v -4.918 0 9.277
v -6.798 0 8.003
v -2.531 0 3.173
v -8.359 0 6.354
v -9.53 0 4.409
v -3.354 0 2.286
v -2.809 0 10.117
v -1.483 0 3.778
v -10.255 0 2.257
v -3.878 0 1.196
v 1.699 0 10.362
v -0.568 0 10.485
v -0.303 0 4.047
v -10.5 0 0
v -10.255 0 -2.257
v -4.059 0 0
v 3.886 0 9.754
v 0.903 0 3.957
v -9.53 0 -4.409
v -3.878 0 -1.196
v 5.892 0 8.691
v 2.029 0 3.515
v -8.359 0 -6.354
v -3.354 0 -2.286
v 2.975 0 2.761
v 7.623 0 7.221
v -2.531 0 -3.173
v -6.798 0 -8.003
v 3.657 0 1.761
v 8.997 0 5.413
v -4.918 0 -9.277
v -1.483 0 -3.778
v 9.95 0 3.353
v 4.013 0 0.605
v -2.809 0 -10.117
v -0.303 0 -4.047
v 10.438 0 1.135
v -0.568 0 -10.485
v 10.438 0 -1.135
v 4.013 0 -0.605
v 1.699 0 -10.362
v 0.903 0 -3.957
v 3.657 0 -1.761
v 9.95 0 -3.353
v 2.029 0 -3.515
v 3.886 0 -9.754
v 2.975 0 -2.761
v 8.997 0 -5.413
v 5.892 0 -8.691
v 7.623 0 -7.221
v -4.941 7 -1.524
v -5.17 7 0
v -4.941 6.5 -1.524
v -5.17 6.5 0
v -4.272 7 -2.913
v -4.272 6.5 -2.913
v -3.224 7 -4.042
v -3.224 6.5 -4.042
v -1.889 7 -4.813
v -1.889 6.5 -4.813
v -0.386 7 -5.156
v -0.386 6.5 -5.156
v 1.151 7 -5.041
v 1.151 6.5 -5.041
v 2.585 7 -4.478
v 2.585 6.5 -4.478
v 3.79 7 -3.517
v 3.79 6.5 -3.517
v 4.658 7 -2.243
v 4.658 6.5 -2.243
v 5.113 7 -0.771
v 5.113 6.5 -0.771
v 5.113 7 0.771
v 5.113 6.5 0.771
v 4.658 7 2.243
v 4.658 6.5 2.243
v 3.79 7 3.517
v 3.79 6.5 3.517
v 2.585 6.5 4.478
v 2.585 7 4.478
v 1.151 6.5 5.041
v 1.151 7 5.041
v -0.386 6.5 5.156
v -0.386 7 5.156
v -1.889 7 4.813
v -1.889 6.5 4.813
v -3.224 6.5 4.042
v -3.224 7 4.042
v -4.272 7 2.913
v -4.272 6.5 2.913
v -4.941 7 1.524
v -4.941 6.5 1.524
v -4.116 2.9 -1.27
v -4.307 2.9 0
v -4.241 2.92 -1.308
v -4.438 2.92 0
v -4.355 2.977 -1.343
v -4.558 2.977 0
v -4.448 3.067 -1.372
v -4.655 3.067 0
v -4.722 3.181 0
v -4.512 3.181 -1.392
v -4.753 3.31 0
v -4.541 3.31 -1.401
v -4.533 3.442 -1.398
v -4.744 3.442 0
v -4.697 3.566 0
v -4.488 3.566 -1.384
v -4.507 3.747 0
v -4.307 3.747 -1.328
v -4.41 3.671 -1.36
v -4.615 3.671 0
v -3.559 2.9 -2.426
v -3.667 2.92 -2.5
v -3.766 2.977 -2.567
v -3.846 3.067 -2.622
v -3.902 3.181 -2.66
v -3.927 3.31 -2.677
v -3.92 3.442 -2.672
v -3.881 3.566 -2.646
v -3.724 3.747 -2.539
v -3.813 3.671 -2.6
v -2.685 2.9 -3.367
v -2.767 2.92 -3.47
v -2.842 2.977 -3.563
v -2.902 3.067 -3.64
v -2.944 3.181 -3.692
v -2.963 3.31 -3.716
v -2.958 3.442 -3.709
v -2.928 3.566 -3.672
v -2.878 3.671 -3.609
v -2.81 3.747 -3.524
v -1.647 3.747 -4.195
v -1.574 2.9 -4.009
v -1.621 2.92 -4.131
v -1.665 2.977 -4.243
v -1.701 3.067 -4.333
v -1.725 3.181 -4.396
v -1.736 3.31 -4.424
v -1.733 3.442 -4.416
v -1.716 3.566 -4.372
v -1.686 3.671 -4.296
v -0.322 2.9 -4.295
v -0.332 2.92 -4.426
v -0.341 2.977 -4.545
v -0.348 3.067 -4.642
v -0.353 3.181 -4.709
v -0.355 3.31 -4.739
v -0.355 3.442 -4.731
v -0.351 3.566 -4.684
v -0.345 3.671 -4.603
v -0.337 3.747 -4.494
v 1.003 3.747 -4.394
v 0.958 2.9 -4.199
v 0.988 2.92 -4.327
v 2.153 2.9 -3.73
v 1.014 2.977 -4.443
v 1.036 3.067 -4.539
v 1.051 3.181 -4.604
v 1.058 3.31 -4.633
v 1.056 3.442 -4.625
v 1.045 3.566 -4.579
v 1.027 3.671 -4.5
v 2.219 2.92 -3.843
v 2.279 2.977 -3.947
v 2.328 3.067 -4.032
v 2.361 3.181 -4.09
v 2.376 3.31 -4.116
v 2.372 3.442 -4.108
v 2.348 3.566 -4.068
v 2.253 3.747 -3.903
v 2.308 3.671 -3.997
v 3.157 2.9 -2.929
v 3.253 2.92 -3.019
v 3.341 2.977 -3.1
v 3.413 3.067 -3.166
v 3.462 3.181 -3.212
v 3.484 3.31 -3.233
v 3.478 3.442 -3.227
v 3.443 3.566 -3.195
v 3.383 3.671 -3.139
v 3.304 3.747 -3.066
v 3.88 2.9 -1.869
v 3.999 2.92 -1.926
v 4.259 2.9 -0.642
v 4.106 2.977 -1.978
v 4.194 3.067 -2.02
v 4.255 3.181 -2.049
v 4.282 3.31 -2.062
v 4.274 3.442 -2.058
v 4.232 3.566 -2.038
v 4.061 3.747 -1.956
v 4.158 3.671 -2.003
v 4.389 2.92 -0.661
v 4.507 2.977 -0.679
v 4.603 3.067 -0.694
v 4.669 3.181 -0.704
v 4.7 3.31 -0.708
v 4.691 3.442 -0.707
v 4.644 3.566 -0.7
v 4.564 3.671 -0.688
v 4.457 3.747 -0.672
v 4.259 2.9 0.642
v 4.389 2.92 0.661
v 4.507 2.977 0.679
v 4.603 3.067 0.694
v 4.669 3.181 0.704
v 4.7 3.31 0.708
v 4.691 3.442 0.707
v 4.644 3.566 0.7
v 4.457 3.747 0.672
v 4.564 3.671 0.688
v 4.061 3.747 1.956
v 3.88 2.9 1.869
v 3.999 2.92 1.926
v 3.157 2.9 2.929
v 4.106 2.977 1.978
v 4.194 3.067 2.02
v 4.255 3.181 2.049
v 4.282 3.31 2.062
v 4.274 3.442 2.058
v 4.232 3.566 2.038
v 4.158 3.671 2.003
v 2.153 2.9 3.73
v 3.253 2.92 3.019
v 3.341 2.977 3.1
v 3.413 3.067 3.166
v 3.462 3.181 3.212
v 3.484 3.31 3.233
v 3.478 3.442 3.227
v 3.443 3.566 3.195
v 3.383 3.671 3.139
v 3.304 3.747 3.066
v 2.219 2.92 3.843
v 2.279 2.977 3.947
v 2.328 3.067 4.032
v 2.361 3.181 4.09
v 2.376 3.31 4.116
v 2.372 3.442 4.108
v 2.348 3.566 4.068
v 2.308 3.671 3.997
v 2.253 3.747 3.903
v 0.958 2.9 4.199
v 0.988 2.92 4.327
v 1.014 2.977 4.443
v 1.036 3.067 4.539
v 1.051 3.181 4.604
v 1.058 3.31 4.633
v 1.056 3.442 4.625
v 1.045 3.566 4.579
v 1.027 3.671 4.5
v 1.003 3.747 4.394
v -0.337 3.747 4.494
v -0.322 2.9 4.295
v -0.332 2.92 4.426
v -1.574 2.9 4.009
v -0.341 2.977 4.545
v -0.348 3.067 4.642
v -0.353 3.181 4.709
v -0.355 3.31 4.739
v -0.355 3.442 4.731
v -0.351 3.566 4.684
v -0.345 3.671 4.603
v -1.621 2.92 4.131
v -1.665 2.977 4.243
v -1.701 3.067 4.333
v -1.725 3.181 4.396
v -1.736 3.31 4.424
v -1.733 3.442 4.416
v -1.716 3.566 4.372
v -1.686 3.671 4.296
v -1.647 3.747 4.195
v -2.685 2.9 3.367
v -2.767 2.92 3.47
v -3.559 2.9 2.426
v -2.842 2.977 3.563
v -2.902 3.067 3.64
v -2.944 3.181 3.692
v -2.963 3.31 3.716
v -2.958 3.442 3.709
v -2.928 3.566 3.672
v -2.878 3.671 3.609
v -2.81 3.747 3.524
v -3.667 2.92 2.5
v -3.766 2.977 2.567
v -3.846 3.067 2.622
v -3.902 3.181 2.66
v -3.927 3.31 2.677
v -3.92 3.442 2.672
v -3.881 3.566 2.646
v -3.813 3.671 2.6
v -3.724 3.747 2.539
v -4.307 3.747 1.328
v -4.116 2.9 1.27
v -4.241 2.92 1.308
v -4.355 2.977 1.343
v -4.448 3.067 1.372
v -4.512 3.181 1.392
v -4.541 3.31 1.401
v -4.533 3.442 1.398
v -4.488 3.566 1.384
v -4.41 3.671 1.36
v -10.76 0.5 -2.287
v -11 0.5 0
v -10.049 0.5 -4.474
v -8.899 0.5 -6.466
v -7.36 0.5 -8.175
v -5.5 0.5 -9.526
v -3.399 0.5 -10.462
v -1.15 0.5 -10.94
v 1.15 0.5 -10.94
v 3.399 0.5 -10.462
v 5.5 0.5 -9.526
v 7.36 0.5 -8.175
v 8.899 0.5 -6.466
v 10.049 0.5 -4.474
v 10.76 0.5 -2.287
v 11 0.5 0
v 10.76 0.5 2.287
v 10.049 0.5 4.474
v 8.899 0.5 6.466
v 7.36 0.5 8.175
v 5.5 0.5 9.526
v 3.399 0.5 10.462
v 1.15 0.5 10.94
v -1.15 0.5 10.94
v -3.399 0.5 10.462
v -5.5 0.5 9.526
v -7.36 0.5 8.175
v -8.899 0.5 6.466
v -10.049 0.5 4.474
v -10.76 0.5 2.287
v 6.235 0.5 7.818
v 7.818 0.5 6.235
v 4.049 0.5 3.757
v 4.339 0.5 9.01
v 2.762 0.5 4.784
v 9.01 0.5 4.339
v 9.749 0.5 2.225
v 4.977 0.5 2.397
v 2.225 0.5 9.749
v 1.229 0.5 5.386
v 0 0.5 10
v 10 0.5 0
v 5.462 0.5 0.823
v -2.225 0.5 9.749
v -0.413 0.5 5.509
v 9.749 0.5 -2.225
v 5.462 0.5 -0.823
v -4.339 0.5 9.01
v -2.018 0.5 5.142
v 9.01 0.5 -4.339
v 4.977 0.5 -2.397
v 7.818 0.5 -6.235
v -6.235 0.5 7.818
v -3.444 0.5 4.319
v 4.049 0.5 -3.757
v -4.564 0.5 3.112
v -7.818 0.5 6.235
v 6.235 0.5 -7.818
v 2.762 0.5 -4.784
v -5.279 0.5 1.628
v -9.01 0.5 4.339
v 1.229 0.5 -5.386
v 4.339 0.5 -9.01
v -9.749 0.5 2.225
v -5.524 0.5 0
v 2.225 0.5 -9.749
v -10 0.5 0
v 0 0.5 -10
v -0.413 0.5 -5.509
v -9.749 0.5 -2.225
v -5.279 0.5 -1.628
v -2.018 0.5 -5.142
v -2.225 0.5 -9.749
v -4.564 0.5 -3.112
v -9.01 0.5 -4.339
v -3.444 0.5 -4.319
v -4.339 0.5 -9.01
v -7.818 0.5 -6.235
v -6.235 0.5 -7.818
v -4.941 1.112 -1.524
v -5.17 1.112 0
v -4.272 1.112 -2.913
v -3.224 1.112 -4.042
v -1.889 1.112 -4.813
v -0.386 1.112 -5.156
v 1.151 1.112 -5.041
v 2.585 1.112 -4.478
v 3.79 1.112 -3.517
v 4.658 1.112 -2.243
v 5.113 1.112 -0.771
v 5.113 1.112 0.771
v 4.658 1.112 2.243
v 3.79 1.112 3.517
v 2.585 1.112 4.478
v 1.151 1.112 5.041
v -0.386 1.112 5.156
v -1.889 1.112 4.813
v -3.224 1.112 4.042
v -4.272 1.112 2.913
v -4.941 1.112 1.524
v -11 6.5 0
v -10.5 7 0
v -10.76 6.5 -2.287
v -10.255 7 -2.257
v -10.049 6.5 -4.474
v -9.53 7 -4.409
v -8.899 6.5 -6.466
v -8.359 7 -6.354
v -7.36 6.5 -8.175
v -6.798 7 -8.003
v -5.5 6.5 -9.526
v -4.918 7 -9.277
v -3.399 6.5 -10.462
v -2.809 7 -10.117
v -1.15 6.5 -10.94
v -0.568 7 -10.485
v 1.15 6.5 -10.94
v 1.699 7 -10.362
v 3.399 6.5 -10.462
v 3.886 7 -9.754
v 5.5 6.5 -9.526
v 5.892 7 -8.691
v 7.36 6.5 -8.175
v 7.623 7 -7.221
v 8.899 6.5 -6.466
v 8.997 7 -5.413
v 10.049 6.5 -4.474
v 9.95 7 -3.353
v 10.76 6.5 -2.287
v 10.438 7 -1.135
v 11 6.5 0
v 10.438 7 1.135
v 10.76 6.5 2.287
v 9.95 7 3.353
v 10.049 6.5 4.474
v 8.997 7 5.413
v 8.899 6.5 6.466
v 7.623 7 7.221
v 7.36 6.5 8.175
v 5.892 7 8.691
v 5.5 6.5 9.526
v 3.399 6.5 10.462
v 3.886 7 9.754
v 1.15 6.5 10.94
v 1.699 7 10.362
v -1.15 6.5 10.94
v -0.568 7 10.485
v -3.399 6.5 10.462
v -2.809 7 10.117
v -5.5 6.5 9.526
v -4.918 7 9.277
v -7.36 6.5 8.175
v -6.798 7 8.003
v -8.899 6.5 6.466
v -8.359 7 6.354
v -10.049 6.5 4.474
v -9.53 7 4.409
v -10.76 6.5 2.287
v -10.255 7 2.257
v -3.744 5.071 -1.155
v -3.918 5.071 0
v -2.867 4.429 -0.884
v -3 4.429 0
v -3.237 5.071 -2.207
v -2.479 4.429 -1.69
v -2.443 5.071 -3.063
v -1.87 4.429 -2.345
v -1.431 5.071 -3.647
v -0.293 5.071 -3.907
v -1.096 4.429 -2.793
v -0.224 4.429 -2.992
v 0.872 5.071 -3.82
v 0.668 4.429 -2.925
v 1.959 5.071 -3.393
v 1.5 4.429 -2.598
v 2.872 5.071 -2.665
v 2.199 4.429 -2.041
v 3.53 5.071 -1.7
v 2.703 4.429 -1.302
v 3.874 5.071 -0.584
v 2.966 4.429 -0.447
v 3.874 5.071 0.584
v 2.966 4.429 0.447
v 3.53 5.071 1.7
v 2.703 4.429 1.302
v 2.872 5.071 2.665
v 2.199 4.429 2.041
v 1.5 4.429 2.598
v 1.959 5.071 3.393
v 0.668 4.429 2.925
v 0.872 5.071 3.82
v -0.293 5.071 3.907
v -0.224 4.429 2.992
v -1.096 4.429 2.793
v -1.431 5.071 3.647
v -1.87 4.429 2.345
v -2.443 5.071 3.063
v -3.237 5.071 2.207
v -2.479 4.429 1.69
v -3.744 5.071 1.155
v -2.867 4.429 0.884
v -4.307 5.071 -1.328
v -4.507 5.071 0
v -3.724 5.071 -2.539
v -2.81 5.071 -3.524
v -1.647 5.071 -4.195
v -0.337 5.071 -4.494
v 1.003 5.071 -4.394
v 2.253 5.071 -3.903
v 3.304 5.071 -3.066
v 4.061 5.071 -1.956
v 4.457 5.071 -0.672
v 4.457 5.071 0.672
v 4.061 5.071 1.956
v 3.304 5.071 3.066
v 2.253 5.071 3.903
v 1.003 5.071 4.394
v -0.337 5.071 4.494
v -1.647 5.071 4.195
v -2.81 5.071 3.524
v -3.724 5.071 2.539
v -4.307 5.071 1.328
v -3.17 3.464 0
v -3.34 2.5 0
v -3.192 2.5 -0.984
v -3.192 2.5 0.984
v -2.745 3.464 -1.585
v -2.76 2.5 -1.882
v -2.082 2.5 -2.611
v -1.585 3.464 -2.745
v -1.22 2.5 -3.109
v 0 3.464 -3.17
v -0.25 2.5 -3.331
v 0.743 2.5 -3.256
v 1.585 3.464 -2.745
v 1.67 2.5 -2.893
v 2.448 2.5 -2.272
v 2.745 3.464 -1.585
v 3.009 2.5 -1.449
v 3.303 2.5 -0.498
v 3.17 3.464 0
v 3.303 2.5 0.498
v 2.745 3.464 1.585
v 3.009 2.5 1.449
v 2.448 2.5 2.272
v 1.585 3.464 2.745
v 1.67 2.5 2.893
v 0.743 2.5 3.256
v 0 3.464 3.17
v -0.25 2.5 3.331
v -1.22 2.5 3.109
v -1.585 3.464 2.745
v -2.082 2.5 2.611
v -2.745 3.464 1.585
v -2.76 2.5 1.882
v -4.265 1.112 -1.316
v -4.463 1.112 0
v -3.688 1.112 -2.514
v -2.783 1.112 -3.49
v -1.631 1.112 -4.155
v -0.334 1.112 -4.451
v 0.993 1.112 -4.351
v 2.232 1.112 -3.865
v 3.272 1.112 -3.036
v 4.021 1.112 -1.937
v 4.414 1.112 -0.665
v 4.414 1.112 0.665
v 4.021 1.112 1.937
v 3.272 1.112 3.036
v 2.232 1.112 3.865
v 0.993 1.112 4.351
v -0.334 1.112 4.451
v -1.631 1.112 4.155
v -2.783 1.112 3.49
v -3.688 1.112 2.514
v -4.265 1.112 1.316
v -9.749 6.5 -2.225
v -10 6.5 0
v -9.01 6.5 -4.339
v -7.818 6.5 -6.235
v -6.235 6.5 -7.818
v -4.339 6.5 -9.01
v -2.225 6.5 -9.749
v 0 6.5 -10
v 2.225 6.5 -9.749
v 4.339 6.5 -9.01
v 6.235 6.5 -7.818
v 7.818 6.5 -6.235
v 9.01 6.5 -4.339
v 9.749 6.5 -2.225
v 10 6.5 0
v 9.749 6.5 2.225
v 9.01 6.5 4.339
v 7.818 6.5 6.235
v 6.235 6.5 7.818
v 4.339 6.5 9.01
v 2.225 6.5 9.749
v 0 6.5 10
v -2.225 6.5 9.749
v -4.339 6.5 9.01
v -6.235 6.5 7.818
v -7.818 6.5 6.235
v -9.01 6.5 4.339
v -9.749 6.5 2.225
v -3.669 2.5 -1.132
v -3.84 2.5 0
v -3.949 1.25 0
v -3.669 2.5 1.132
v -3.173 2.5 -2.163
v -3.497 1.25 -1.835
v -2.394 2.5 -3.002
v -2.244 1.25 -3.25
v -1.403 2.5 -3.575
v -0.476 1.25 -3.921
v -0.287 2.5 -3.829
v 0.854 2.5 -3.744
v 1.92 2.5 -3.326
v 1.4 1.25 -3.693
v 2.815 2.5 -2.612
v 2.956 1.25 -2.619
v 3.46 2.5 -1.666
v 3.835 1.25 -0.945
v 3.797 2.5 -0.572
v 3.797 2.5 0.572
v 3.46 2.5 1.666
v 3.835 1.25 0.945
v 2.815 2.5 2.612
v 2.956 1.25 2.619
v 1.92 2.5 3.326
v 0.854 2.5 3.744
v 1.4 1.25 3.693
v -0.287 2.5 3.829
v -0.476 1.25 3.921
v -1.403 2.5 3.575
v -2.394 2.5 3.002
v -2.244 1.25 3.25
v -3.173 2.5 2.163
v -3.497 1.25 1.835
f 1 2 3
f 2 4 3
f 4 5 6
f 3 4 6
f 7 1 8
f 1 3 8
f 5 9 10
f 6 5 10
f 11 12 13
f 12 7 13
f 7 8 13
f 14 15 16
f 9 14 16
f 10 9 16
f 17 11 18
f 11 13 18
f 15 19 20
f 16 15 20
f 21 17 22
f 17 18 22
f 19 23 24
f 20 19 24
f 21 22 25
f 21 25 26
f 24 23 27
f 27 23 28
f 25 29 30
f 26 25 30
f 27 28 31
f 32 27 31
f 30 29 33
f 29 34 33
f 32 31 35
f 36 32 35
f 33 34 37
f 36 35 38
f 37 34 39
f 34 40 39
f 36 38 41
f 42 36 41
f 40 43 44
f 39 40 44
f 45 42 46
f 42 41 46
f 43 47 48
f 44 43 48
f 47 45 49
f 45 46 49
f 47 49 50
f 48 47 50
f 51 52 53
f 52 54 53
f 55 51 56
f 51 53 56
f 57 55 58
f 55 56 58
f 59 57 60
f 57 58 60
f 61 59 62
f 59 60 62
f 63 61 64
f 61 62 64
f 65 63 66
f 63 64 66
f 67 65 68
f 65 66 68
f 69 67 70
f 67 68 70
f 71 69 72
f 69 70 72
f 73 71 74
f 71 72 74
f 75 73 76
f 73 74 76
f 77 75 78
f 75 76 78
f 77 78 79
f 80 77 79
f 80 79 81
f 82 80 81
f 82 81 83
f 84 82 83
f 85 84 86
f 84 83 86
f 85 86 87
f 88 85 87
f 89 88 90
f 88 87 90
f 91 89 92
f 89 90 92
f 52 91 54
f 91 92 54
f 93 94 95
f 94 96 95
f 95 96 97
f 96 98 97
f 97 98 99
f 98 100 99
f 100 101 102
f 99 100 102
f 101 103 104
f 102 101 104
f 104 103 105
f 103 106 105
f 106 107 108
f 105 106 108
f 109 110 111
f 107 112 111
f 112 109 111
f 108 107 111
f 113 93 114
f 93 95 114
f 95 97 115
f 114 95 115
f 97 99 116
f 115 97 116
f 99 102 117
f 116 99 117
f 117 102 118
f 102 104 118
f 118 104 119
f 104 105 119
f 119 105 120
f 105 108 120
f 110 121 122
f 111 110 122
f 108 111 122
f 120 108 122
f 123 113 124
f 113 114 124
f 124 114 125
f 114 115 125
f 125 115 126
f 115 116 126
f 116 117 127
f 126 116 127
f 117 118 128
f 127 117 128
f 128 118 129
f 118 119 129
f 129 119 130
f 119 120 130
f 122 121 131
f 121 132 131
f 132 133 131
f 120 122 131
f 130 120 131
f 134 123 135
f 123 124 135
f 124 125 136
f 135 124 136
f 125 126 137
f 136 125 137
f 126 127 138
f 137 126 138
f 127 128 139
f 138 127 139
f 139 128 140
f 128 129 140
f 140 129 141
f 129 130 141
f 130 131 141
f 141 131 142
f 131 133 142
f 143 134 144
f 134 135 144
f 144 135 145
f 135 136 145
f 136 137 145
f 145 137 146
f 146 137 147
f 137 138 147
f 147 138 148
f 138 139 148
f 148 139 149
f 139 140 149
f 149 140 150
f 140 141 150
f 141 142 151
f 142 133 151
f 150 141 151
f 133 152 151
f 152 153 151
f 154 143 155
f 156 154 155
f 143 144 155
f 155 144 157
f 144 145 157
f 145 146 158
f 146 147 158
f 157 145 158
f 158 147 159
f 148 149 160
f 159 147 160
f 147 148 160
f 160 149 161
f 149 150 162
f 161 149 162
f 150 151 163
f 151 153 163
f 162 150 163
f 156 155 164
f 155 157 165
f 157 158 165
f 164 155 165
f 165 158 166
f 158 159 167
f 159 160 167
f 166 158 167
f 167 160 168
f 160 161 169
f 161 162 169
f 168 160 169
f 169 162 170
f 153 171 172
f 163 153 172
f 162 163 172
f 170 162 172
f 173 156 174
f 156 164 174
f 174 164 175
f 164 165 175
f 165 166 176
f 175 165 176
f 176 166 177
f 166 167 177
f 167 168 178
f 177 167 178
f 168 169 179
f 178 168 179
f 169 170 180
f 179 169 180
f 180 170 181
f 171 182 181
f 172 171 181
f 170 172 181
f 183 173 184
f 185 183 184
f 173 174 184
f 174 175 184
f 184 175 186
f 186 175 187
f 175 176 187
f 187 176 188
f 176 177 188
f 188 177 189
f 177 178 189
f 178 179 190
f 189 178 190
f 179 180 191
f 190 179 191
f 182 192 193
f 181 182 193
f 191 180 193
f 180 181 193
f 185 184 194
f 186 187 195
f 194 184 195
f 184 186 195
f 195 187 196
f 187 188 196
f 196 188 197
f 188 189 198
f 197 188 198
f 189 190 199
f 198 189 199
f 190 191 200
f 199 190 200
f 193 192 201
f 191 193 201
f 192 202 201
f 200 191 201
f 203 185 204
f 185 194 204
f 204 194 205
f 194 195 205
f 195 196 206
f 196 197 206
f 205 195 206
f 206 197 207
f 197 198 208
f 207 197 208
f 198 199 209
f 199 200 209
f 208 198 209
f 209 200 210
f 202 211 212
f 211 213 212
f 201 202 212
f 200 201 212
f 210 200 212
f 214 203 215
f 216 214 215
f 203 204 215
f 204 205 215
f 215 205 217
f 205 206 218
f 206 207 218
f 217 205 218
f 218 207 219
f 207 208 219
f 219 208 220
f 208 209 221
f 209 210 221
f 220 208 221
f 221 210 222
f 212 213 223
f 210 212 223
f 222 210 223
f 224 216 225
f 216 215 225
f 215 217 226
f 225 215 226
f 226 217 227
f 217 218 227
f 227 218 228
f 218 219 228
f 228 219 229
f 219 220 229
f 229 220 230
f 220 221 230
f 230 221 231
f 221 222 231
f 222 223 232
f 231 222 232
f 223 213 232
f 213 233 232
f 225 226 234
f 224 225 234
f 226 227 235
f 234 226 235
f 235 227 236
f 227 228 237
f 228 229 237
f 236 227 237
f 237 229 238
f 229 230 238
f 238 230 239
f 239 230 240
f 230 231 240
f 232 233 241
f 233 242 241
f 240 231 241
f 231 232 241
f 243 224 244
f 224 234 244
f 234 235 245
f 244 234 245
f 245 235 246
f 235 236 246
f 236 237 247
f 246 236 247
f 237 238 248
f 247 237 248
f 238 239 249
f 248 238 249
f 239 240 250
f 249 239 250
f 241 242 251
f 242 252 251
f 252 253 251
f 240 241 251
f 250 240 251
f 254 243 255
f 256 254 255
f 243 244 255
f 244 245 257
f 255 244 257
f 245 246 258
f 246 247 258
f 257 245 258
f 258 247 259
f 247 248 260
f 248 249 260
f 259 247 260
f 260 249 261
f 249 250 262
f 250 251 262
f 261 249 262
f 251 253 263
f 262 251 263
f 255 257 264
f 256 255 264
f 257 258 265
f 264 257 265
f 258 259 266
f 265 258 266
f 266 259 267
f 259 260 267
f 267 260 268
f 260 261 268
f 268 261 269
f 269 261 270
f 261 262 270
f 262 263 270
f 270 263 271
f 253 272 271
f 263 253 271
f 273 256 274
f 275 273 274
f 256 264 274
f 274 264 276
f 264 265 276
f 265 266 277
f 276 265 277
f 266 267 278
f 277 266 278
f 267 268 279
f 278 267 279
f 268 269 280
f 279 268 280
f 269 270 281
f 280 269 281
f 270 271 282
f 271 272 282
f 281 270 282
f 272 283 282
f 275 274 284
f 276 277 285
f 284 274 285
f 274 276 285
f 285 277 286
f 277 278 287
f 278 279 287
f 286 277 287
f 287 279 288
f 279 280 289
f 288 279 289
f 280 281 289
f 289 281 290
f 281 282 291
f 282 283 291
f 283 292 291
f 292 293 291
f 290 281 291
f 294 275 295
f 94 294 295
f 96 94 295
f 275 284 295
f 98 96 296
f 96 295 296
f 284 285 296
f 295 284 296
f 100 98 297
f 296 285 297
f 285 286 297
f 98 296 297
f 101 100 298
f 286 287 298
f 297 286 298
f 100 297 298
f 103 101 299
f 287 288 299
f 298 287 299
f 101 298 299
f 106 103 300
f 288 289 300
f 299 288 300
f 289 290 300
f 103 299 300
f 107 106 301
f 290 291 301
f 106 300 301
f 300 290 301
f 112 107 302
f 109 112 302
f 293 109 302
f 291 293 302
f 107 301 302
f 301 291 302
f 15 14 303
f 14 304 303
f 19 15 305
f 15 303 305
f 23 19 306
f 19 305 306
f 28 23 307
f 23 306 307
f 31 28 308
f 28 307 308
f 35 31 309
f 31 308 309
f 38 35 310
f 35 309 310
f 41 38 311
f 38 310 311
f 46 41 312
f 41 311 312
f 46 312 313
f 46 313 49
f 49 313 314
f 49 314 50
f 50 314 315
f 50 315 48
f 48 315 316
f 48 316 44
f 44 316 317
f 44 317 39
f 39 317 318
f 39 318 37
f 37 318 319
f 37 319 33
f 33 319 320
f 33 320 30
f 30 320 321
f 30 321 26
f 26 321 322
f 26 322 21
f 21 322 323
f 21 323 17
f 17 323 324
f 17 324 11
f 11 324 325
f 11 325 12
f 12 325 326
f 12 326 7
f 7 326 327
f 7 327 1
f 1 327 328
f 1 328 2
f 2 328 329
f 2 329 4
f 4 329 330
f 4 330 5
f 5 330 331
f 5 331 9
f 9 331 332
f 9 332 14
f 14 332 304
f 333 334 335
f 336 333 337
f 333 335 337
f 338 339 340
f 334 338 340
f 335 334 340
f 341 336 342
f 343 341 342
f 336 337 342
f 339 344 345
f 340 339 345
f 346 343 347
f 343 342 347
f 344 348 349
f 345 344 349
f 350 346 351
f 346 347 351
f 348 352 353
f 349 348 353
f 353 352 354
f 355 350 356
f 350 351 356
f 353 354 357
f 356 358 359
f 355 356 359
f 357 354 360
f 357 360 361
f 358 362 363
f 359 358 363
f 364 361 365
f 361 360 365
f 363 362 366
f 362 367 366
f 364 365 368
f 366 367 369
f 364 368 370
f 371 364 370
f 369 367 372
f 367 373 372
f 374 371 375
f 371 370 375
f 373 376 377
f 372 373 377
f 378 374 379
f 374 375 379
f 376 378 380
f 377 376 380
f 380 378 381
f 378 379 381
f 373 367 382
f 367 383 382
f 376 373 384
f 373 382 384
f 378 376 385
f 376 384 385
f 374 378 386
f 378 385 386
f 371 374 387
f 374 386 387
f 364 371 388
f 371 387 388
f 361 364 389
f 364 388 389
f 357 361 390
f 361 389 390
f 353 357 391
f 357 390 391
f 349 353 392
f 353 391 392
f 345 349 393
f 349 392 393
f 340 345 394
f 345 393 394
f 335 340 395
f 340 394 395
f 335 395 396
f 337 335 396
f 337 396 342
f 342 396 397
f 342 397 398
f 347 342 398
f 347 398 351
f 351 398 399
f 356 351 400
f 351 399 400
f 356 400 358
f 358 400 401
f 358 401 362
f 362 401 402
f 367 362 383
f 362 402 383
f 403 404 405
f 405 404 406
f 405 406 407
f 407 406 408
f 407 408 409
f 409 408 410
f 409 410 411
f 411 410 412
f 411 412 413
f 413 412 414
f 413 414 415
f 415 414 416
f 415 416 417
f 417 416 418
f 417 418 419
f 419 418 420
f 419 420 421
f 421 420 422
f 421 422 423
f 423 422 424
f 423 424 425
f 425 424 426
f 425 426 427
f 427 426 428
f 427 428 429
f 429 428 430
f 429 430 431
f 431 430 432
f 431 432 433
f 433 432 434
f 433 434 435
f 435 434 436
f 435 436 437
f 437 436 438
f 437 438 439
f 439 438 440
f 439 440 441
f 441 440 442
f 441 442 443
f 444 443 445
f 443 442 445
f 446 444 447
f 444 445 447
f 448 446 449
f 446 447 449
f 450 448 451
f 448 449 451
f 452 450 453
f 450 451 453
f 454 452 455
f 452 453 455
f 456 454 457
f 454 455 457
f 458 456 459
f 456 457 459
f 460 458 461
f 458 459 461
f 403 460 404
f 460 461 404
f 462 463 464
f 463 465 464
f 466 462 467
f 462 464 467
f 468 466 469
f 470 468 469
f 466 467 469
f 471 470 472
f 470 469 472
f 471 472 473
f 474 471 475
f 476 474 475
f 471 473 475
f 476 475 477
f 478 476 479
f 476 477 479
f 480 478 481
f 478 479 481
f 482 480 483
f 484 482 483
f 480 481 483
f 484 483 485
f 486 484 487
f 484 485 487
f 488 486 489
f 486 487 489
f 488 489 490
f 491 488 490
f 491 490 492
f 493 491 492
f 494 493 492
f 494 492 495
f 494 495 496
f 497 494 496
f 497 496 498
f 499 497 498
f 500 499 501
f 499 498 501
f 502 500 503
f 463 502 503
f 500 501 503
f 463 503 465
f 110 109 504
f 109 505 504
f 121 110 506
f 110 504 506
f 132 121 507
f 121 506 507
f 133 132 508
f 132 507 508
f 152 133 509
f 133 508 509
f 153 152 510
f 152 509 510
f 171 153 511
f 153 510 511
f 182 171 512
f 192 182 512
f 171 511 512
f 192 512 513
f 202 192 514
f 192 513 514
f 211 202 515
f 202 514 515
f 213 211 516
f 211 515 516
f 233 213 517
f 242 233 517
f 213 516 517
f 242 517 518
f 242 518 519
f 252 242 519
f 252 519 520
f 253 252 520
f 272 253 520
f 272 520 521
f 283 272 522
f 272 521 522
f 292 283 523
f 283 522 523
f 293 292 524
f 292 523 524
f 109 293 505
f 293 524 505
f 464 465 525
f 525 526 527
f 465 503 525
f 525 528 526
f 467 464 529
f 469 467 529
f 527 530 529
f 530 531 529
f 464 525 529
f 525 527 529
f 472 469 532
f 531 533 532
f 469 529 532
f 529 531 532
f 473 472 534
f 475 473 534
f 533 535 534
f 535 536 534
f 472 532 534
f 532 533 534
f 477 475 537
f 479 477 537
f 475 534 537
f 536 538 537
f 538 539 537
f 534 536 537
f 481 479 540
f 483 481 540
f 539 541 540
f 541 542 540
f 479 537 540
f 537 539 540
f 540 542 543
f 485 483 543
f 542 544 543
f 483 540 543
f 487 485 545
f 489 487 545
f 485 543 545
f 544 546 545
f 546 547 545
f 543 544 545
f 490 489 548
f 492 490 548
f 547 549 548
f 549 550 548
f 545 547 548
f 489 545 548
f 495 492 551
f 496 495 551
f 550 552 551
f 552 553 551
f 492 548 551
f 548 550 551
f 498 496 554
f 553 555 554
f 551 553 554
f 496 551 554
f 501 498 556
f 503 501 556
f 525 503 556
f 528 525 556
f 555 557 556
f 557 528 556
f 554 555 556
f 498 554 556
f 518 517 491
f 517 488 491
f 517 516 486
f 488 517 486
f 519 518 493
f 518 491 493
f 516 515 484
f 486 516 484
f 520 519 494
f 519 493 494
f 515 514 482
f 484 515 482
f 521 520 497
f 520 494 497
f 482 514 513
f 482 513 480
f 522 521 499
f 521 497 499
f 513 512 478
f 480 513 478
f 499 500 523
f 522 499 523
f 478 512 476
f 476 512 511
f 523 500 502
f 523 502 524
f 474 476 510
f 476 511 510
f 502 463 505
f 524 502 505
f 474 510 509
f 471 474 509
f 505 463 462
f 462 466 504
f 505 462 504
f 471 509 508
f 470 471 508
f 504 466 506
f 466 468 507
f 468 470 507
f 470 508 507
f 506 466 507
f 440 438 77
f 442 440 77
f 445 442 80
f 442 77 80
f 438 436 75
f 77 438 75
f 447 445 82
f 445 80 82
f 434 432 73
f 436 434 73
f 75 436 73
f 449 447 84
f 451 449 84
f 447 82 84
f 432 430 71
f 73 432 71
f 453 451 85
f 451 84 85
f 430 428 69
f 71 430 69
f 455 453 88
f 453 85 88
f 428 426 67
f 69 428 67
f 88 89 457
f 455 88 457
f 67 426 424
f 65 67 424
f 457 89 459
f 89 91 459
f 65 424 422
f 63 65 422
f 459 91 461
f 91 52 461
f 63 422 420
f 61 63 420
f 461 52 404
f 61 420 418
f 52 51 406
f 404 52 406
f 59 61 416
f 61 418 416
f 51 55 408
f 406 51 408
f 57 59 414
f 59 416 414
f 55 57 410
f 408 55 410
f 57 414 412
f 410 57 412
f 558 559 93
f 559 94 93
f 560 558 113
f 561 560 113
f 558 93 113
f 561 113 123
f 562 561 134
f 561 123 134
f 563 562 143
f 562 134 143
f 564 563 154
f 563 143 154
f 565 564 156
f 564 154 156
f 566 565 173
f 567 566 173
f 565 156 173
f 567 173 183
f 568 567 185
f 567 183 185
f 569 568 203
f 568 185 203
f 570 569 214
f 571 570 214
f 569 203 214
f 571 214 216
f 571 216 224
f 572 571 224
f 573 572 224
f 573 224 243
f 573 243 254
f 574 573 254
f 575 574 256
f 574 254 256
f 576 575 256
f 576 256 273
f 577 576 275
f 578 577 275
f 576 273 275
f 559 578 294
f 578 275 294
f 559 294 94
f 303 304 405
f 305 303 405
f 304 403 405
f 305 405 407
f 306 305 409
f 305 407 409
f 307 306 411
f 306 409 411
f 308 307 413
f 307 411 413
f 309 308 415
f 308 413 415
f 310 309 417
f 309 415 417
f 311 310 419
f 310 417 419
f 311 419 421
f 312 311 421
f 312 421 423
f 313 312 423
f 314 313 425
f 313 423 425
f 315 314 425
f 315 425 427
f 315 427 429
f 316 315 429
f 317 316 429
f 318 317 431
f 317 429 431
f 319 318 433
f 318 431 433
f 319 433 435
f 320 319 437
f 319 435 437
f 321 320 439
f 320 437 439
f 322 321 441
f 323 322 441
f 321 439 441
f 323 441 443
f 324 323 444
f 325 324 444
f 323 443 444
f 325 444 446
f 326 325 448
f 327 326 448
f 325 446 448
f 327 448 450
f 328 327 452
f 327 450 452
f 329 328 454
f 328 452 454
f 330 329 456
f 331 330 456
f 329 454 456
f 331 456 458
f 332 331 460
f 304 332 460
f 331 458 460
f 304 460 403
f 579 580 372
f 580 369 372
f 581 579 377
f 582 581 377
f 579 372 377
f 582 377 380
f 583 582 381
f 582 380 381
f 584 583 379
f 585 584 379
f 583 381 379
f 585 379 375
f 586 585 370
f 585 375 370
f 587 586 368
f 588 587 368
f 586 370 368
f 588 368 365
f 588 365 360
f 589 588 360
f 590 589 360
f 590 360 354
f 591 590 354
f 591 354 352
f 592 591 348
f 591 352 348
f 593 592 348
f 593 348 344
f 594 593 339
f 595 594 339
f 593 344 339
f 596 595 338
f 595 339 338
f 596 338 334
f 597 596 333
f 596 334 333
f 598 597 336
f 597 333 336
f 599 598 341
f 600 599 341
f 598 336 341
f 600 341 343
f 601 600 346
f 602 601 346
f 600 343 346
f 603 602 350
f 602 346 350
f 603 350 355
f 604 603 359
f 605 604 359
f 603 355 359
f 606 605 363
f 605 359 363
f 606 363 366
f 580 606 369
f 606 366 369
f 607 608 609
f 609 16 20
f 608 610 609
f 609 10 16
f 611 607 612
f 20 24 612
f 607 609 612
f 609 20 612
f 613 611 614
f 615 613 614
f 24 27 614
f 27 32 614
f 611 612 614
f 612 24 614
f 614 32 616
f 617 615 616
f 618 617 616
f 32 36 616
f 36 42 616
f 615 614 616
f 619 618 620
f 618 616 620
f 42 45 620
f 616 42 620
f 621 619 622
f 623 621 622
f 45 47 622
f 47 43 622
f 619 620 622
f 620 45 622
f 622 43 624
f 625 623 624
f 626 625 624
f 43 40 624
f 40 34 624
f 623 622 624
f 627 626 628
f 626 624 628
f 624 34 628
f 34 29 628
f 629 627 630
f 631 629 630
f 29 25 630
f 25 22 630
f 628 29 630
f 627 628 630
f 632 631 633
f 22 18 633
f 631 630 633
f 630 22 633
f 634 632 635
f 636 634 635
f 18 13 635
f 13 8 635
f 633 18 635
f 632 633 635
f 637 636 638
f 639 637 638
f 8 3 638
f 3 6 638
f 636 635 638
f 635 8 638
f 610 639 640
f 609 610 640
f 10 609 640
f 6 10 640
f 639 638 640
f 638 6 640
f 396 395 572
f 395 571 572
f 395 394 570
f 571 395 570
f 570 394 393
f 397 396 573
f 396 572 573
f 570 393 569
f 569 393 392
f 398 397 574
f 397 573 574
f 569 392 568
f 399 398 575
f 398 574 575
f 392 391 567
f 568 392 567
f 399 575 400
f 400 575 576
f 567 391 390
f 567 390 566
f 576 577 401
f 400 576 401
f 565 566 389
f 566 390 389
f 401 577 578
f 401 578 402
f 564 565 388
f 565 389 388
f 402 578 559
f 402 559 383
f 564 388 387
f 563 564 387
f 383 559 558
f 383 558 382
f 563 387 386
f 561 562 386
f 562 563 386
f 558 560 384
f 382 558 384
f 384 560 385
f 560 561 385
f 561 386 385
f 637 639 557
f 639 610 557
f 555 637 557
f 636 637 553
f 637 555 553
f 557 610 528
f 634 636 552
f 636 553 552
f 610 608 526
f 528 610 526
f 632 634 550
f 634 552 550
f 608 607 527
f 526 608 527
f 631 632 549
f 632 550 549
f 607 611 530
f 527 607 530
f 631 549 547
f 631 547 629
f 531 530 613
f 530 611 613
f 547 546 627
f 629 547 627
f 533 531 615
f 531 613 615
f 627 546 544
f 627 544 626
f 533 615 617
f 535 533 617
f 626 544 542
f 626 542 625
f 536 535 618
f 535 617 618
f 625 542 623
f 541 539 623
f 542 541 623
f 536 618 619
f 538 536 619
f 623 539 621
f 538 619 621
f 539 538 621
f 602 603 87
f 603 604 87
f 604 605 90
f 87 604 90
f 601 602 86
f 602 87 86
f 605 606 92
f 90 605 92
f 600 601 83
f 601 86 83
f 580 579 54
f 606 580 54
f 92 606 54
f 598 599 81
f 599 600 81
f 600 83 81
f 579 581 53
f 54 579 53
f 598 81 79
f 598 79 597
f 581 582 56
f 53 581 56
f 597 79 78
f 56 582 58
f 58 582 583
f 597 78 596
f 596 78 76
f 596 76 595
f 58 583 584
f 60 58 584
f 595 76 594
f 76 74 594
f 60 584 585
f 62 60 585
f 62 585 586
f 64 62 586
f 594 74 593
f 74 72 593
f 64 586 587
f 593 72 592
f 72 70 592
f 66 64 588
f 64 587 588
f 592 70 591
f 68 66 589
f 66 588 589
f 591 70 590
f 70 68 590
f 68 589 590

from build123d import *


with BuildPart() as part:
    # 草图1 → 旋转1 (revolve)
    with BuildSketch(Plane.XY):
        with BuildLine():
            Line((-10, 0.5), (-5.524030949, 0.5))
            Line((-5.524030949, 0.5), (-5.170477558, 1.112372436))
            Line((-5.170477558, 1.112372436), (-4.463370777, 1.112372436))
            Line((-4.463370777, 1.112372436), (-4.30697363, 2.9))
            ThreePointArc((-4.30697363, 2.9), (-4.74222381, 3.244464966), (-4.50697363, 3.747213595))
            Line((-4.50697363, 3.747213595), (-4.50697363, 5.071428571))
            Line((-4.50697363, 5.071428571), (-3.918095147, 5.071428571))
            Line((-3.918095147, 5.071428571), (-3, 4.428571429))
            Line((-3, 4.428571429), (-3.340059177, 2.5))
            Line((-3.340059177, 2.5), (-3.840059177, 2.5))
            Line((-3.840059177, 2.5), (-4.058780836, 0))
            Line((-4.058780836, 0), (-10.5, 0))
            Line((-10.5, 0), (-11, 0.5))
            Line((-11, 0.5), (-11, 6.5))
            Line((-11, 6.5), (-10.5, 7))
            Line((-10.5, 7), (-5.170477558, 7))
            Line((-5.170477558, 7), (-5.170477558, 6.5))
            Line((-5.170477558, 6.5), (-10, 6.5))
            Line((-10, 6.5), (-10, 0.5))
        make_face()
    revolve(axis=Axis((0, 5.836193369, 0), (0, -1, 0)))


solid = part.part
